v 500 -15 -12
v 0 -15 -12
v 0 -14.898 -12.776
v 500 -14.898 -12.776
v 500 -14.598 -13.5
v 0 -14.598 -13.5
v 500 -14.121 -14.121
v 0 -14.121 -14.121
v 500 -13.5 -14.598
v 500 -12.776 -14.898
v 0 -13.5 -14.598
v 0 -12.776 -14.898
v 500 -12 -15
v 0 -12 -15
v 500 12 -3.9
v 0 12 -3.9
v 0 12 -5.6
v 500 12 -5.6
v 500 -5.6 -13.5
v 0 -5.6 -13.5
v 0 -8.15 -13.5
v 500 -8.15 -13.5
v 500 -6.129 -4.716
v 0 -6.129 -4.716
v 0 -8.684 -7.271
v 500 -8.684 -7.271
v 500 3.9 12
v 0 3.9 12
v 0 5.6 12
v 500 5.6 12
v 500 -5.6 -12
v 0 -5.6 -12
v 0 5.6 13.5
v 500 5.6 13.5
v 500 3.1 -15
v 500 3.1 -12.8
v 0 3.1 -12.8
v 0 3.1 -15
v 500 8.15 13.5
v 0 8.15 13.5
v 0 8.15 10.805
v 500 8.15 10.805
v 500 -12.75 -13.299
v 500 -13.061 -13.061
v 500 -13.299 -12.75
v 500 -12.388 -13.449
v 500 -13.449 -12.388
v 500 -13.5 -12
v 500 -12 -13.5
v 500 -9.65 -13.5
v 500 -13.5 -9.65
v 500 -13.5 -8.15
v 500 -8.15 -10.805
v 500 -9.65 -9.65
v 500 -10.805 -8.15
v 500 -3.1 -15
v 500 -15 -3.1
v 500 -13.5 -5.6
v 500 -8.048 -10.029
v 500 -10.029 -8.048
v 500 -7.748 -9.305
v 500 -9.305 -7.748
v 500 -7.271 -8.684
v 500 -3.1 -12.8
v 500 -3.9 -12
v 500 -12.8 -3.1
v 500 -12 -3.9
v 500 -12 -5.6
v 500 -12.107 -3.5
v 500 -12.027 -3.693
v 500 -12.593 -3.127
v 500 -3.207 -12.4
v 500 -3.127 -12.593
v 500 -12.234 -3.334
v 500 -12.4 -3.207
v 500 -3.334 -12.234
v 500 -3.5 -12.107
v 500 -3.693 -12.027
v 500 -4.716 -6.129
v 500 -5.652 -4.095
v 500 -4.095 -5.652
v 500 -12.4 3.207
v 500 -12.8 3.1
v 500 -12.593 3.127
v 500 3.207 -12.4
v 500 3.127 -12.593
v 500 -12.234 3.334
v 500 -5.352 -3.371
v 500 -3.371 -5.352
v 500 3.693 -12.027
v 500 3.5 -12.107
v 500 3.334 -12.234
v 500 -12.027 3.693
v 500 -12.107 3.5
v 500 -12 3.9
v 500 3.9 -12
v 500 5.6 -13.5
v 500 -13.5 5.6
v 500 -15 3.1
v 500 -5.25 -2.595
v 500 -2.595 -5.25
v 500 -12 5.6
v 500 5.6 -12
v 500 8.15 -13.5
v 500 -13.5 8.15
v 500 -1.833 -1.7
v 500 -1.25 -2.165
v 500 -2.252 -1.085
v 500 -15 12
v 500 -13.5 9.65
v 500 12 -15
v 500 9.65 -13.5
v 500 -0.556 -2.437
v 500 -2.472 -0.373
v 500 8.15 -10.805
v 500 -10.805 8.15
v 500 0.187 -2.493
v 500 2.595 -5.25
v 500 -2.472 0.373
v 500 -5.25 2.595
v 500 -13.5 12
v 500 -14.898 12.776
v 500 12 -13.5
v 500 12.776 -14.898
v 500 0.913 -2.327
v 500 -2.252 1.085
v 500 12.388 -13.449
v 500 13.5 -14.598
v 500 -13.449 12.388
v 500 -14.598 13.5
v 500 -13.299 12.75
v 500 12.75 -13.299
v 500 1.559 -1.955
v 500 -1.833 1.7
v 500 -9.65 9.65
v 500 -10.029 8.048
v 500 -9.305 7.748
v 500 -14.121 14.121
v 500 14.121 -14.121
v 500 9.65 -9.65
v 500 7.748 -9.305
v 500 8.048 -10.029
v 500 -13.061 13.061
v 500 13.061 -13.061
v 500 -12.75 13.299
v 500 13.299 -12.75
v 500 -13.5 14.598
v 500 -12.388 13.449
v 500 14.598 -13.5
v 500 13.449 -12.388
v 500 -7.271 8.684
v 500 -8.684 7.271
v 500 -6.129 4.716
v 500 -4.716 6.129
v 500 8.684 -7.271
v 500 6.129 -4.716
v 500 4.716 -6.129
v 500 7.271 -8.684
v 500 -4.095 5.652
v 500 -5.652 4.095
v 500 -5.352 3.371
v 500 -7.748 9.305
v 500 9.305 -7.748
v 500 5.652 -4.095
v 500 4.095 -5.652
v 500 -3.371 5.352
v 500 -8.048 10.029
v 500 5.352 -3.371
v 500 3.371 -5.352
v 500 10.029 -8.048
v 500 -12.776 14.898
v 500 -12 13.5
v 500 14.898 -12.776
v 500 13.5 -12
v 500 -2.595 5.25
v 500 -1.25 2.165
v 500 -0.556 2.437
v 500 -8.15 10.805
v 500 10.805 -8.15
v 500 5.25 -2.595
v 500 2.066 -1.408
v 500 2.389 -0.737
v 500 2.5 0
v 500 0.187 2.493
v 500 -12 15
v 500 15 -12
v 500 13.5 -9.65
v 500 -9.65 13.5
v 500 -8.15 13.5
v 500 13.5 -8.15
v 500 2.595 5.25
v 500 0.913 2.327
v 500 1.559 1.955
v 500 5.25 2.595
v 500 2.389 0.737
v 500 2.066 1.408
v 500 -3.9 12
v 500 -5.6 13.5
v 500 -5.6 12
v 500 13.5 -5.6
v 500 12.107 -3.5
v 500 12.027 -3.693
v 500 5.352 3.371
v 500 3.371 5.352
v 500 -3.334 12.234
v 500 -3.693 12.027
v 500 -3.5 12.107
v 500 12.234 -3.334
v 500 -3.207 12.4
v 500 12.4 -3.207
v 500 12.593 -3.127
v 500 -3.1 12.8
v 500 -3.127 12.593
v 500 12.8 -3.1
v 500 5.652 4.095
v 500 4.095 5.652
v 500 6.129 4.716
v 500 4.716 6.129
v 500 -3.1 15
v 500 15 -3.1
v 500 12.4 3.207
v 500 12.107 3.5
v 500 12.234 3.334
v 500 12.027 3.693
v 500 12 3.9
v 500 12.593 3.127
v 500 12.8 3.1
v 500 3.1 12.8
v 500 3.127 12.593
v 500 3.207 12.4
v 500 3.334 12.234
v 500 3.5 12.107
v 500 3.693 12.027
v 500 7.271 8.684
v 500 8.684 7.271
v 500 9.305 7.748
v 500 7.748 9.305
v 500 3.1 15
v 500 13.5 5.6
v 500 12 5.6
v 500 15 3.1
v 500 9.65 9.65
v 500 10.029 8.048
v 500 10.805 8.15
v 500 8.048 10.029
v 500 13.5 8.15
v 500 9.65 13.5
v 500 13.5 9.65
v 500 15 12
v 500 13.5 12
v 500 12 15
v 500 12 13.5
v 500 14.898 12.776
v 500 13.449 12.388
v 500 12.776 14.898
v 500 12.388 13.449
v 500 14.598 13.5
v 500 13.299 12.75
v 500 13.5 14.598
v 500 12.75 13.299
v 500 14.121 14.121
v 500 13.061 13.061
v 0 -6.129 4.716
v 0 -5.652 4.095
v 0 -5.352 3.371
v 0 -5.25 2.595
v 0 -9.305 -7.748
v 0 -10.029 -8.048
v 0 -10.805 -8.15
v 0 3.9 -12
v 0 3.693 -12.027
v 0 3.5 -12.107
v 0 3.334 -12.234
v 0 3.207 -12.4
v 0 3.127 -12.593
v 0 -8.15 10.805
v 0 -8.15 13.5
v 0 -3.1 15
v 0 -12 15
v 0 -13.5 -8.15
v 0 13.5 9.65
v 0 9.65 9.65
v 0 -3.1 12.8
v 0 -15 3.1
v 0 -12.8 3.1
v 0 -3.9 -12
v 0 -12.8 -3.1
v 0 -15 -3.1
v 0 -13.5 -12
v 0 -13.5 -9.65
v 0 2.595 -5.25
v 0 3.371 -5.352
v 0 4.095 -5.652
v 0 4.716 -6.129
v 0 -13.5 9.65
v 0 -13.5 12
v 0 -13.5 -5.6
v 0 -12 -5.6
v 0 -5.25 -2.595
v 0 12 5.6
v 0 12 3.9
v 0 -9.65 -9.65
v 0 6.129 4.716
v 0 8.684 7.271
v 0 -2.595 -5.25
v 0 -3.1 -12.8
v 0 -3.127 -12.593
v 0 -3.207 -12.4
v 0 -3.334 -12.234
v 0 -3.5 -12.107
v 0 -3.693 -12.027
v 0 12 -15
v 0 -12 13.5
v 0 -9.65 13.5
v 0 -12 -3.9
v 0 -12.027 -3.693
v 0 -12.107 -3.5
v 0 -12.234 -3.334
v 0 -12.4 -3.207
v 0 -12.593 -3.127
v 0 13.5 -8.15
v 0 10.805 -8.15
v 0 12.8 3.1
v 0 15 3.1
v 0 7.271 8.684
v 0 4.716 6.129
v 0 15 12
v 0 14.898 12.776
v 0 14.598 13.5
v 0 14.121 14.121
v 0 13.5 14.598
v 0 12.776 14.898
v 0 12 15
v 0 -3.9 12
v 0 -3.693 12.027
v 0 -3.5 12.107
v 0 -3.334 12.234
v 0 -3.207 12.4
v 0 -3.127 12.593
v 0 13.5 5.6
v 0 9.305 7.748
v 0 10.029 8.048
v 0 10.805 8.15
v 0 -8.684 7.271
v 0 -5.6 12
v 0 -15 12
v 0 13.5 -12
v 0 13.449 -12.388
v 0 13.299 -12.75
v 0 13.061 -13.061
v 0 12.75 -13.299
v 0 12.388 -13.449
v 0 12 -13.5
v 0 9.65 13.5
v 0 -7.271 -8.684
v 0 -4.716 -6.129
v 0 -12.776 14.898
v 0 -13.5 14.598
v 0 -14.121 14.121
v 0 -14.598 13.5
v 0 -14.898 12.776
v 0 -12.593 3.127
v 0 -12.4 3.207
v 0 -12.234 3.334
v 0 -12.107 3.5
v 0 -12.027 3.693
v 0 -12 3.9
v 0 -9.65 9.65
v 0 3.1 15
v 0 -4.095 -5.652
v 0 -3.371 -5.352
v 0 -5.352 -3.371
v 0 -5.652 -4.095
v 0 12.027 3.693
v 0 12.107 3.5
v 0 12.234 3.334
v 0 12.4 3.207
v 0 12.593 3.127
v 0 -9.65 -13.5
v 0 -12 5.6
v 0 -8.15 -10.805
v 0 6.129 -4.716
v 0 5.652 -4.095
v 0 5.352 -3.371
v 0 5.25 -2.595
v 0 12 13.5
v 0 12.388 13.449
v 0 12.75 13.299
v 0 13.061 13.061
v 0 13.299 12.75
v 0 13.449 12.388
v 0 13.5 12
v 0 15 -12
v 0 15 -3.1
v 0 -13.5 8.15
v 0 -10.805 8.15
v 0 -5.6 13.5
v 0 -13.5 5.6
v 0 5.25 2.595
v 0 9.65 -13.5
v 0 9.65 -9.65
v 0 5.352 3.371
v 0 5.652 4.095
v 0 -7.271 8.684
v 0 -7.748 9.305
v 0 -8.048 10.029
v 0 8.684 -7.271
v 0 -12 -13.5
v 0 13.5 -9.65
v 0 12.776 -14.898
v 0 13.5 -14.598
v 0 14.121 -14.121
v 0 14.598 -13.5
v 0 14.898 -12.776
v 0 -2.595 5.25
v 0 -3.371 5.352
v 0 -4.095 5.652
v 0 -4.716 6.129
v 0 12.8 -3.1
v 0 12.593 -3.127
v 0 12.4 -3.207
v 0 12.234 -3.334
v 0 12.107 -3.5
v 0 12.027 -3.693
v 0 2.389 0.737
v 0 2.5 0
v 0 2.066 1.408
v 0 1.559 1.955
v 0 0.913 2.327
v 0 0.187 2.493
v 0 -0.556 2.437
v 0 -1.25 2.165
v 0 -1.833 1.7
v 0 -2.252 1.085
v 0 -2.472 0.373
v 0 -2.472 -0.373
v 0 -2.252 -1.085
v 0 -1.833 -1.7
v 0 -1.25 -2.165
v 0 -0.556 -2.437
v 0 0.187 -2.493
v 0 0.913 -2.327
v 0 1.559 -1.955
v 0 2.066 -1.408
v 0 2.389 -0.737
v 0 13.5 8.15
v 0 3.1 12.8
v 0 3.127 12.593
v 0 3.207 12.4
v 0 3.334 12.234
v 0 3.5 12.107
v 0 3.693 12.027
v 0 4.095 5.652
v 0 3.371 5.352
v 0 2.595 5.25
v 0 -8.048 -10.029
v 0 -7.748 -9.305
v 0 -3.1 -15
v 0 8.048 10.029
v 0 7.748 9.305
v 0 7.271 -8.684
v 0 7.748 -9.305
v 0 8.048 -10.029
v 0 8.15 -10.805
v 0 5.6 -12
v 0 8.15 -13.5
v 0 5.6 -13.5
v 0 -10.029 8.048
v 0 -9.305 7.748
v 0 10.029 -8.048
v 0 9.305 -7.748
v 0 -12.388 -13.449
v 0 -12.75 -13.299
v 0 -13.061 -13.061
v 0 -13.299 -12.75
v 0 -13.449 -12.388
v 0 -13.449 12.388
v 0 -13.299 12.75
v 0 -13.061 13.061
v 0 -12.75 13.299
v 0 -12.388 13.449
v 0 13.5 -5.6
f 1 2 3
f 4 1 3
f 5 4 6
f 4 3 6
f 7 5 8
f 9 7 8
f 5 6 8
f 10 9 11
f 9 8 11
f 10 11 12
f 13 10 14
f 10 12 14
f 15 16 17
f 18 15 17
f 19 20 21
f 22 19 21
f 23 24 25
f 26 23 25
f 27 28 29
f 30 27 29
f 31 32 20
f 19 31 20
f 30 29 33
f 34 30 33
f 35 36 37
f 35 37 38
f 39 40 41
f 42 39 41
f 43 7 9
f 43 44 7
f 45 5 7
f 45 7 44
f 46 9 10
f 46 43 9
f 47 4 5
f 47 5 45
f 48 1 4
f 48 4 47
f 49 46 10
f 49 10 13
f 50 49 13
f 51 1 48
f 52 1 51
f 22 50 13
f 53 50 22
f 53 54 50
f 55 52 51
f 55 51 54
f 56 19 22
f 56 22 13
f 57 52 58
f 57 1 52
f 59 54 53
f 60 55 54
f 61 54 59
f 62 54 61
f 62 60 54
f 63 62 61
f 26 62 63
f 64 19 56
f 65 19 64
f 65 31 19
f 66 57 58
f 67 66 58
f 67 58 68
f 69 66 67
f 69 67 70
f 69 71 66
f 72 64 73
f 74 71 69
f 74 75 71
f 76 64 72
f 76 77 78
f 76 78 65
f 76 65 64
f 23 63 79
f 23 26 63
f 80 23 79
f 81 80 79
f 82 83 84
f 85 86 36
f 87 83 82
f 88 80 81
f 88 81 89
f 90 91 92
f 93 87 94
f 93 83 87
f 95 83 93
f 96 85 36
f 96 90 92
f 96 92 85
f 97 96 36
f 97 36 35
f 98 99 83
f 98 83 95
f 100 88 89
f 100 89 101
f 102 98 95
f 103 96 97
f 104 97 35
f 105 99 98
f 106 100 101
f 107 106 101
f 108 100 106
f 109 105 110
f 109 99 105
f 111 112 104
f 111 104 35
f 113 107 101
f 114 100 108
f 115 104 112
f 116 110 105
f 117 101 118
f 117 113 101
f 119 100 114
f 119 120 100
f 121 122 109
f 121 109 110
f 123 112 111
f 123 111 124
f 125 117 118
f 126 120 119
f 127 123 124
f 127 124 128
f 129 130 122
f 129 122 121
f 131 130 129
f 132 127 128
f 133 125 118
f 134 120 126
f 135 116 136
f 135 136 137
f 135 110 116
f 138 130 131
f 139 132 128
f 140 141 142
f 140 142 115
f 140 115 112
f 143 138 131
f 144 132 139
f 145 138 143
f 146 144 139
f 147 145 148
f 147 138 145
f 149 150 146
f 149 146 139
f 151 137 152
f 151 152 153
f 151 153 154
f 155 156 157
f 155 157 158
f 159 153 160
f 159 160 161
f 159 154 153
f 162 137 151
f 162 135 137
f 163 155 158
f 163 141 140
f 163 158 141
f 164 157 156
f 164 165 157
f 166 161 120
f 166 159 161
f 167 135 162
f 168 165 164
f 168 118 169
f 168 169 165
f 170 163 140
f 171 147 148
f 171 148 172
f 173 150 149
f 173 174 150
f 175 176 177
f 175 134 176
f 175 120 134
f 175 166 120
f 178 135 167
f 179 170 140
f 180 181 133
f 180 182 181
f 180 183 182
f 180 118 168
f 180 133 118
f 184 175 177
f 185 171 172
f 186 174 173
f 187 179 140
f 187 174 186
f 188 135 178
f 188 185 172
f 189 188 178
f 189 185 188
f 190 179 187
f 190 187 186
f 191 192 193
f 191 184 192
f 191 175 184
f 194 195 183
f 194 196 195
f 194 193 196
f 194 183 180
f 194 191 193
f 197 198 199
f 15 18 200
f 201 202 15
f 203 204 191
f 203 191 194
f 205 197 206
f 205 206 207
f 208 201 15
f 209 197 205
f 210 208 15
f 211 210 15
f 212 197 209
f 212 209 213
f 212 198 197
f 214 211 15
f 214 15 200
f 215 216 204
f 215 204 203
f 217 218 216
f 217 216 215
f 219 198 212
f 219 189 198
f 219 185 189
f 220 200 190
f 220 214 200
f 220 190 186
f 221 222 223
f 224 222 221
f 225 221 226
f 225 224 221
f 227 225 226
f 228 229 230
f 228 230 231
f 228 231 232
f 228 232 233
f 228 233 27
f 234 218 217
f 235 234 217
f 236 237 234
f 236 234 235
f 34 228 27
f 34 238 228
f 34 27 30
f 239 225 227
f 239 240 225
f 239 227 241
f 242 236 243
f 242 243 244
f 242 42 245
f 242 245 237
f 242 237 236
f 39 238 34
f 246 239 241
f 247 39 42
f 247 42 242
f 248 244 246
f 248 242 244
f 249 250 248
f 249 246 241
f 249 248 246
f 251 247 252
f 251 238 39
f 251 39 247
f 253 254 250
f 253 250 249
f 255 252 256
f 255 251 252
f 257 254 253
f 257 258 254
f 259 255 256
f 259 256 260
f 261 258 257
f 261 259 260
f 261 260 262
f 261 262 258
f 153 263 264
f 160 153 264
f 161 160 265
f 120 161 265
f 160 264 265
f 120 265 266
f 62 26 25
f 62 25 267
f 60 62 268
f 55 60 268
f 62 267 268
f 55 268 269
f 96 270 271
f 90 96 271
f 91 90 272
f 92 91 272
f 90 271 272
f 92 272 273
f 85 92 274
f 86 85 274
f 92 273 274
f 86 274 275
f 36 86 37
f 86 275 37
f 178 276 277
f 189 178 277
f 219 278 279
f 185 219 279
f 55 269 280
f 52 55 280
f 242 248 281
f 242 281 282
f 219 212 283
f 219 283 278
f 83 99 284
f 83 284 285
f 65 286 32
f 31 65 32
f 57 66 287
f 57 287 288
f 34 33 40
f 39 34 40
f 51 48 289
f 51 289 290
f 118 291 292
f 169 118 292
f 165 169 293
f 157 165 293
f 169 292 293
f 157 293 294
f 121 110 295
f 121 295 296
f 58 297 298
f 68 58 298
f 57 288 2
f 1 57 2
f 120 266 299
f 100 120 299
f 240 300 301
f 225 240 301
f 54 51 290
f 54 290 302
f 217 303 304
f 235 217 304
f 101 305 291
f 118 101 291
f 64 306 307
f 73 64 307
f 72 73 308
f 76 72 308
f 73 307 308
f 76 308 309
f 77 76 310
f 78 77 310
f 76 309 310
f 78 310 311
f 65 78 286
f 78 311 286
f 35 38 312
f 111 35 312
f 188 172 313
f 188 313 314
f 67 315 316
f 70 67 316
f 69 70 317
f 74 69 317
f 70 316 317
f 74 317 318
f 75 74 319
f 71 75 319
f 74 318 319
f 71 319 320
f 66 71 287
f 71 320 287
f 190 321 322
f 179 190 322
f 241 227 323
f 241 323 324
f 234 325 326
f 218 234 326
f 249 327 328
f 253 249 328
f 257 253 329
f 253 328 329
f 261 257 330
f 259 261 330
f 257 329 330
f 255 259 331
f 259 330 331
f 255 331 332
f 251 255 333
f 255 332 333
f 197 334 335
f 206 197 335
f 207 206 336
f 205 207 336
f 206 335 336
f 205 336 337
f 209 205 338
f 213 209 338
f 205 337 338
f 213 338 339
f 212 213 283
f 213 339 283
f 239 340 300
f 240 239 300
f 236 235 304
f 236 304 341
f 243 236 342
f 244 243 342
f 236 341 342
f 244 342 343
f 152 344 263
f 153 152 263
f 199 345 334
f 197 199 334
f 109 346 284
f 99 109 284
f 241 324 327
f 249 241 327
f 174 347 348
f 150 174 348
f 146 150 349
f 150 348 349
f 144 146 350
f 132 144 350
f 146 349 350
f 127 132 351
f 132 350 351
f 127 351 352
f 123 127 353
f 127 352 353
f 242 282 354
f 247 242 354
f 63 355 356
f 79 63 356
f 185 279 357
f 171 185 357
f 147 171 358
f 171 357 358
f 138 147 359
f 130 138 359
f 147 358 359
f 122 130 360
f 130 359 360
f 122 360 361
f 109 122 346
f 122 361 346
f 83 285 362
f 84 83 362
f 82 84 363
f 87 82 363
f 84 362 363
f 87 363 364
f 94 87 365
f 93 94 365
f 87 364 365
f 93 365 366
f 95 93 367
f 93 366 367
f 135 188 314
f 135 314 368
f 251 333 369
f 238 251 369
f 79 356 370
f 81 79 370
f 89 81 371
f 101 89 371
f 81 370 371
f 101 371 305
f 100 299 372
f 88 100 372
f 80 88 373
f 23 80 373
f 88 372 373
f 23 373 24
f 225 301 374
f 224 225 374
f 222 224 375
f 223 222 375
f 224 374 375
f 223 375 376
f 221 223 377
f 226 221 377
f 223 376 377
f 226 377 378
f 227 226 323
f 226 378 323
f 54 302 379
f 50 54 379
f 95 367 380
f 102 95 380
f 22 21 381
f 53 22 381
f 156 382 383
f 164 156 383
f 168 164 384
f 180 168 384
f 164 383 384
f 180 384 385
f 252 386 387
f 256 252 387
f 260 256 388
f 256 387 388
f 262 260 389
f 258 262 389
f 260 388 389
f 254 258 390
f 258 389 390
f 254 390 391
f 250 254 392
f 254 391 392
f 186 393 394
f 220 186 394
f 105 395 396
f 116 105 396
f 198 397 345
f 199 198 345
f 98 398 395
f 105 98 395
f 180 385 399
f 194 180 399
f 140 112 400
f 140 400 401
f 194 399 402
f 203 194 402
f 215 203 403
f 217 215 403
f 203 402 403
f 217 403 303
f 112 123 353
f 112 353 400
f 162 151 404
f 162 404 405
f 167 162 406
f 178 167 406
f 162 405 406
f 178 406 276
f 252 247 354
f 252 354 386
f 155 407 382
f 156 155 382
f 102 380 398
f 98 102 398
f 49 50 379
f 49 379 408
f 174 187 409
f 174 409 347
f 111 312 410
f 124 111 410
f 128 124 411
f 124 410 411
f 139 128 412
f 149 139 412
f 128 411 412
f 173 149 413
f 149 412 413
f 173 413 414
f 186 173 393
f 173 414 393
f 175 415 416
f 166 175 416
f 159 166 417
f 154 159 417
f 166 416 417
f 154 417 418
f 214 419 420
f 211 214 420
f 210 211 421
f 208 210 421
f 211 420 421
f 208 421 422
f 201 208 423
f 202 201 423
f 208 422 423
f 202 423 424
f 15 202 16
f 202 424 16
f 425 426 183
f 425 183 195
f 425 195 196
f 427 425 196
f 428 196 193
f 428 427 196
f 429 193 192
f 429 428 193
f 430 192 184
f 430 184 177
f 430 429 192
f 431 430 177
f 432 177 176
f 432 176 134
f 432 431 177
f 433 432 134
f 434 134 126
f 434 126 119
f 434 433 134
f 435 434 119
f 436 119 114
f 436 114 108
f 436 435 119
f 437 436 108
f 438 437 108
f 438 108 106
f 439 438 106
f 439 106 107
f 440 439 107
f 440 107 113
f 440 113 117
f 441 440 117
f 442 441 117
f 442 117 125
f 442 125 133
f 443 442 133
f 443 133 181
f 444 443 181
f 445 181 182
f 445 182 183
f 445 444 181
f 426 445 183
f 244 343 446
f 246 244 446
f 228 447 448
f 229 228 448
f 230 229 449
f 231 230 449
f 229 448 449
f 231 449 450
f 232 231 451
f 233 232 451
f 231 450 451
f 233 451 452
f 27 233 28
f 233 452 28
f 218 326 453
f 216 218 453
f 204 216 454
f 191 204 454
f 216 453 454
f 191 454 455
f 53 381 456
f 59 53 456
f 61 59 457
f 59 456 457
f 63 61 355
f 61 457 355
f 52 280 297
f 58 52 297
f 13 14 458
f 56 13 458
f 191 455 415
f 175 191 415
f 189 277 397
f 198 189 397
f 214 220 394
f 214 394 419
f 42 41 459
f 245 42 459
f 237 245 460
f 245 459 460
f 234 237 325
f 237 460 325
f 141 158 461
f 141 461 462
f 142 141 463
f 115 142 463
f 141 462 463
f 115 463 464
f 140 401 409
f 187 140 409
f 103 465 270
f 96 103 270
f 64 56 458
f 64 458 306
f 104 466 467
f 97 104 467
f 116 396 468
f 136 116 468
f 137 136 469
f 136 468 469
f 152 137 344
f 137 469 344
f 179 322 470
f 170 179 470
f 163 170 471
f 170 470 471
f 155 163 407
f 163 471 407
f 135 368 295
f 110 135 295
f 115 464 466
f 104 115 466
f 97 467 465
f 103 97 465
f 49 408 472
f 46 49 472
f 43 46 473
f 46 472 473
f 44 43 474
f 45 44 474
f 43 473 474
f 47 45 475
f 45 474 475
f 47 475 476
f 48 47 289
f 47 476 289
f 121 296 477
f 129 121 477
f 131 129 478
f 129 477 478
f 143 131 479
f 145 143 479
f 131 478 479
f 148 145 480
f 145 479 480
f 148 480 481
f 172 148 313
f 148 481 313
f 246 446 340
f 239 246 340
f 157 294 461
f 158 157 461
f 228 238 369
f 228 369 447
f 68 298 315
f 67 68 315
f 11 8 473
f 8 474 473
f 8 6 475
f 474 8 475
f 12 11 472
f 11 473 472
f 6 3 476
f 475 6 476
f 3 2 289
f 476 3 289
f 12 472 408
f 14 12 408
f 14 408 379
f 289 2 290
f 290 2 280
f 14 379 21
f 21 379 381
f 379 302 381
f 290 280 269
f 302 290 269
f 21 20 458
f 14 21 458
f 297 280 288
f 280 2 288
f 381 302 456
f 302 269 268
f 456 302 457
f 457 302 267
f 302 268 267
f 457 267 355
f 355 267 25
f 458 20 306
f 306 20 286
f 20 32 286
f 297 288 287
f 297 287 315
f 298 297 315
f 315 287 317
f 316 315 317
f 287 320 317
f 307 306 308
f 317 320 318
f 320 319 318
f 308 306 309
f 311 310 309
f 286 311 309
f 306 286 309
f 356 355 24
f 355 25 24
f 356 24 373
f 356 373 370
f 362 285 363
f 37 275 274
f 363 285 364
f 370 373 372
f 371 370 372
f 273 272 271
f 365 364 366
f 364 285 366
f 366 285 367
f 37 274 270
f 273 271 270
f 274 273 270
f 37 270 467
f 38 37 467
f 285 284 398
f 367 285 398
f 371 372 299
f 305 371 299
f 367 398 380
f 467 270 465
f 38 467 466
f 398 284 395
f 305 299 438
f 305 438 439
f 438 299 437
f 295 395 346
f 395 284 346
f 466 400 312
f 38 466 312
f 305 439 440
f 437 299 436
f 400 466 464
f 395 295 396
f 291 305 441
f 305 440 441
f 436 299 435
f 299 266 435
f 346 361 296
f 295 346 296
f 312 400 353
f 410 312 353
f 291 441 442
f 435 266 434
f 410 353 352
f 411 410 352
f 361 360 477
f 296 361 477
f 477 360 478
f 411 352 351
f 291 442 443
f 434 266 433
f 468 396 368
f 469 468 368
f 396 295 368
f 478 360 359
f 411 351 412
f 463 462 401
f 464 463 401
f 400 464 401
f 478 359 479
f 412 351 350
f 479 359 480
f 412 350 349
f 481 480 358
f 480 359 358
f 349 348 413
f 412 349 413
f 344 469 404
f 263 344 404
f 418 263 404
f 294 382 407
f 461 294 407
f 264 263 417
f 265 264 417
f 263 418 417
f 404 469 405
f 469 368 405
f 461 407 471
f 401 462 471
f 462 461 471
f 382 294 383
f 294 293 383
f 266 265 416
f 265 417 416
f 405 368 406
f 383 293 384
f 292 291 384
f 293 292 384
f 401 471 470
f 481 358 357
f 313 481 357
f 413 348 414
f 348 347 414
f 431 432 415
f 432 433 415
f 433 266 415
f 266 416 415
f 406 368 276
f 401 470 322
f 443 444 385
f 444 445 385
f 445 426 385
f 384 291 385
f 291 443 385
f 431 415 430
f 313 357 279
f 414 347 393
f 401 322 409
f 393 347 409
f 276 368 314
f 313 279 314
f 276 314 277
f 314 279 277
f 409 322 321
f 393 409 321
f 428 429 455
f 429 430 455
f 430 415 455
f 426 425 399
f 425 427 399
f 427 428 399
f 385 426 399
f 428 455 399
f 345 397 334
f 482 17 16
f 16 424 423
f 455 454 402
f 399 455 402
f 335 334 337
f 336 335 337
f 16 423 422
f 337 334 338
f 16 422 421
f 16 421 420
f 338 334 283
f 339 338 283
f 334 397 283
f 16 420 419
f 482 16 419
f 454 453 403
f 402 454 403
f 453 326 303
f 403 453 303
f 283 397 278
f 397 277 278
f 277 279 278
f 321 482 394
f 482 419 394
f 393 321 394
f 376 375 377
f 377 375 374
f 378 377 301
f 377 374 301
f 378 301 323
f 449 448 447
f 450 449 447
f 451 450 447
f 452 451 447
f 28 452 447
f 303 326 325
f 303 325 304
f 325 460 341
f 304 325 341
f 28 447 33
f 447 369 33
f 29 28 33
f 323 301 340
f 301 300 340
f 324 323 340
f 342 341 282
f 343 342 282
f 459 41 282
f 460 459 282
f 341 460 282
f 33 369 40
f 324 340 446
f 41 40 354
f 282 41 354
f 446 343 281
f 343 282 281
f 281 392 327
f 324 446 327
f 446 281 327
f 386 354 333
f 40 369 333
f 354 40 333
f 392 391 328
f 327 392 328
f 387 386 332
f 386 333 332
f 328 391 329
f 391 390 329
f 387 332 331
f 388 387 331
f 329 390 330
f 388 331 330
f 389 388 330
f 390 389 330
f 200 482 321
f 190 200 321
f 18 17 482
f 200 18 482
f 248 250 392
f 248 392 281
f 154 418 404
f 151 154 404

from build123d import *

# Parameters (mm, degrees)
F0_R     = 2.5
F1_DEPTH = 500


with BuildPart() as f1:
    # F0 (on Right) → F1 (new body)
    with BuildSketch(Plane.YZ):
        with BuildLine():
            Line((-3.1, 15), (-12, 15))
            ThreePointArc((-12, 15), (-14.12132, 14.12132), (-15, 12))
            Line((-15, 12), (-15, 3.1))
            Line((-15, 3.1), (-12.8, 3.1))
            ThreePointArc((-12.8, 3.1), (-12.234315, 3.334315), (-12, 3.9))
            Line((-12, 3.9), (-12, 5.6))
            Line((-12, 5.6), (-13.5, 5.6))
            Line((-13.5, 5.6), (-13.5, 8.15))
            Line((-13.5, 8.15), (-10.805, 8.15))
            ThreePointArc((-10.805, 8.15), (-9.65695, 7.921639), (-8.68368, 7.27132))
            Line((-8.68368, 7.27132), (-6.12868, 4.71632))
            ThreePointArc((-6.12868, 4.71632), (-5.478361, 3.74305), (-5.25, 2.595))
            Line((-5.25, 2.595), (-5.25, -2.595))
            ThreePointArc((-5.25, -2.595), (-5.478361, -3.74305), (-6.12868, -4.71632))
            Line((-6.12868, -4.71632), (-8.68368, -7.27132))
            ThreePointArc((-8.68368, -7.27132), (-9.65695, -7.921639), (-10.805, -8.15))
            Line((-10.805, -8.15), (-13.5, -8.15))
            Line((-13.5, -8.15), (-13.5, -5.6))
            Line((-13.5, -5.6), (-12, -5.6))
            Line((-12, -5.6), (-12, -3.9))
            ThreePointArc((-12, -3.9), (-12.234315, -3.334315), (-12.8, -3.1))
            Line((-12.8, -3.1), (-15, -3.1))
            Line((-15, -3.1), (-15, -12))
            ThreePointArc((-15, -12), (-14.12132, -14.12132), (-12, -15))
            Line((-12, -15), (-3.1, -15))
            Line((-3.1, -15), (-3.1, -12.8))
            ThreePointArc((-3.1, -12.8), (-3.334315, -12.234315), (-3.9, -12))
            Line((-3.9, -12), (-5.6, -12))
            Line((-5.6, -12), (-5.6, -13.5))
            Line((-5.6, -13.5), (-8.15, -13.5))
            Line((-8.15, -13.5), (-8.15, -10.805))
            ThreePointArc((-8.15, -10.805), (-7.921639, -9.65695), (-7.27132, -8.68368))
            Line((-7.27132, -8.68368), (-4.71632, -6.12868))
            ThreePointArc((-4.71632, -6.12868), (-3.74305, -5.478361), (-2.595, -5.25))
            Line((-2.595, -5.25), (2.595, -5.25))
            ThreePointArc((2.595, -5.25), (3.74305, -5.478361), (4.71632, -6.12868))
            Line((4.71632, -6.12868), (7.27132, -8.68368))
            ThreePointArc((7.27132, -8.68368), (7.921639, -9.65695), (8.15, -10.805))
            Line((8.15, -10.805), (8.15, -13.5))
            Line((8.15, -13.5), (5.6, -13.5))
            Line((5.6, -13.5), (5.6, -12))
            Line((5.6, -12), (3.9, -12))
            ThreePointArc((3.9, -12), (3.334315, -12.234315), (3.1, -12.8))
            Line((3.1, -12.8), (3.1, -15))
            Line((3.1, -15), (12, -15))
            ThreePointArc((12, -15), (14.12132, -14.12132), (15, -12))
            Line((15, -12), (15, -3.1))
            Line((15, -3.1), (12.8, -3.1))
            ThreePointArc((12.8, -3.1), (12.234315, -3.334315), (12, -3.9))
            Line((12, -3.9), (12, -5.6))
            Line((12, -5.6), (13.5, -5.6))
            Line((13.5, -5.6), (13.5, -8.15))
            Line((13.5, -8.15), (10.805, -8.15))
            ThreePointArc((10.805, -8.15), (9.65695, -7.921639), (8.68368, -7.27132))
            Line((8.68368, -7.27132), (6.12868, -4.71632))
            ThreePointArc((6.12868, -4.71632), (5.478361, -3.74305), (5.25, -2.595))
            Line((5.25, -2.595), (5.25, 2.595))
            ThreePointArc((5.25, 2.595), (5.478361, 3.74305), (6.12868, 4.71632))
            Line((6.12868, 4.71632), (8.68368, 7.27132))
            ThreePointArc((8.68368, 7.27132), (9.65695, 7.921639), (10.805, 8.15))
            Line((10.805, 8.15), (13.5, 8.15))
            Line((13.5, 8.15), (13.5, 5.6))
            Line((13.5, 5.6), (12, 5.6))
            Line((12, 5.6), (12, 3.9))
            ThreePointArc((12, 3.9), (12.234315, 3.334315), (12.8, 3.1))
            Line((12.8, 3.1), (15, 3.1))
            Line((15, 3.1), (15, 12))
            ThreePointArc((15, 12), (14.12132, 14.12132), (12, 15))
            Line((12, 15), (3.1, 15))
            Line((3.1, 15), (3.1, 12.8))
            ThreePointArc((3.1, 12.8), (3.334315, 12.234315), (3.9, 12))
            Line((3.9, 12), (5.6, 12))
            Line((5.6, 12), (5.6, 13.5))
            Line((5.6, 13.5), (8.15, 13.5))
            Line((8.15, 13.5), (8.15, 10.805))
            ThreePointArc((8.15, 10.805), (7.921639, 9.65695), (7.27132, 8.68368))
            Line((7.27132, 8.68368), (4.71632, 6.12868))
            ThreePointArc((4.71632, 6.12868), (3.74305, 5.478361), (2.595, 5.25))
            Line((2.595, 5.25), (-2.595, 5.25))
            ThreePointArc((-2.595, 5.25), (-3.74305, 5.478361), (-4.71632, 6.12868))
            Line((-4.71632, 6.12868), (-7.27132, 8.68368))
            ThreePointArc((-7.27132, 8.68368), (-7.921639, 9.65695), (-8.15, 10.805))
            Line((-8.15, 10.805), (-8.15, 13.5))
            Line((-8.15, 13.5), (-5.6, 13.5))
            Line((-5.6, 13.5), (-5.6, 12))
            Line((-5.6, 12), (-3.9, 12))
            ThreePointArc((-3.9, 12), (-3.334315, 12.234315), (-3.1, 12.8))
            Line((-3.1, 12.8), (-3.1, 15))
        make_face()
        with BuildLine():
            ThreePointArc((-12, -13.5), (-13.06066, -13.06066), (-13.5, -12))
            Line((-13.5, -12), (-13.5, -9.65))
            Line((-13.5, -9.65), (-9.65, -9.65))
            Line((-9.65, -9.65), (-9.65, -13.5))
            Line((-9.65, -13.5), (-12, -13.5))
        make_face(mode=Mode.SUBTRACT)
        with BuildLine():
            ThreePointArc((13.5, -12), (13.06066, -13.06066), (12, -13.5))
            Line((12, -13.5), (9.65, -13.5))
            Line((9.65, -13.5), (9.65, -9.65))
            Line((9.65, -9.65), (13.5, -9.65))
            Line((13.5, -9.65), (13.5, -12))
        make_face(mode=Mode.SUBTRACT)
        Circle(F0_R, mode=Mode.SUBTRACT)
        with BuildLine():
            ThreePointArc((-13.5, 12), (-13.06066, 13.06066), (-12, 13.5))
            Line((-12, 13.5), (-9.65, 13.5))
            Line((-9.65, 13.5), (-9.65, 9.65))
            Line((-9.65, 9.65), (-13.5, 9.65))
            Line((-13.5, 9.65), (-13.5, 12))
        make_face(mode=Mode.SUBTRACT)
        with BuildLine():
            ThreePointArc((12, 13.5), (13.06066, 13.06066), (13.5, 12))
            Line((13.5, 12), (13.5, 9.65))
            Line((13.5, 9.65), (9.65, 9.65))
            Line((9.65, 9.65), (9.65, 13.5))
            Line((9.65, 13.5), (12, 13.5))
        make_face(mode=Mode.SUBTRACT)
    extrude(amount=F1_DEPTH)


solid = f1.part
